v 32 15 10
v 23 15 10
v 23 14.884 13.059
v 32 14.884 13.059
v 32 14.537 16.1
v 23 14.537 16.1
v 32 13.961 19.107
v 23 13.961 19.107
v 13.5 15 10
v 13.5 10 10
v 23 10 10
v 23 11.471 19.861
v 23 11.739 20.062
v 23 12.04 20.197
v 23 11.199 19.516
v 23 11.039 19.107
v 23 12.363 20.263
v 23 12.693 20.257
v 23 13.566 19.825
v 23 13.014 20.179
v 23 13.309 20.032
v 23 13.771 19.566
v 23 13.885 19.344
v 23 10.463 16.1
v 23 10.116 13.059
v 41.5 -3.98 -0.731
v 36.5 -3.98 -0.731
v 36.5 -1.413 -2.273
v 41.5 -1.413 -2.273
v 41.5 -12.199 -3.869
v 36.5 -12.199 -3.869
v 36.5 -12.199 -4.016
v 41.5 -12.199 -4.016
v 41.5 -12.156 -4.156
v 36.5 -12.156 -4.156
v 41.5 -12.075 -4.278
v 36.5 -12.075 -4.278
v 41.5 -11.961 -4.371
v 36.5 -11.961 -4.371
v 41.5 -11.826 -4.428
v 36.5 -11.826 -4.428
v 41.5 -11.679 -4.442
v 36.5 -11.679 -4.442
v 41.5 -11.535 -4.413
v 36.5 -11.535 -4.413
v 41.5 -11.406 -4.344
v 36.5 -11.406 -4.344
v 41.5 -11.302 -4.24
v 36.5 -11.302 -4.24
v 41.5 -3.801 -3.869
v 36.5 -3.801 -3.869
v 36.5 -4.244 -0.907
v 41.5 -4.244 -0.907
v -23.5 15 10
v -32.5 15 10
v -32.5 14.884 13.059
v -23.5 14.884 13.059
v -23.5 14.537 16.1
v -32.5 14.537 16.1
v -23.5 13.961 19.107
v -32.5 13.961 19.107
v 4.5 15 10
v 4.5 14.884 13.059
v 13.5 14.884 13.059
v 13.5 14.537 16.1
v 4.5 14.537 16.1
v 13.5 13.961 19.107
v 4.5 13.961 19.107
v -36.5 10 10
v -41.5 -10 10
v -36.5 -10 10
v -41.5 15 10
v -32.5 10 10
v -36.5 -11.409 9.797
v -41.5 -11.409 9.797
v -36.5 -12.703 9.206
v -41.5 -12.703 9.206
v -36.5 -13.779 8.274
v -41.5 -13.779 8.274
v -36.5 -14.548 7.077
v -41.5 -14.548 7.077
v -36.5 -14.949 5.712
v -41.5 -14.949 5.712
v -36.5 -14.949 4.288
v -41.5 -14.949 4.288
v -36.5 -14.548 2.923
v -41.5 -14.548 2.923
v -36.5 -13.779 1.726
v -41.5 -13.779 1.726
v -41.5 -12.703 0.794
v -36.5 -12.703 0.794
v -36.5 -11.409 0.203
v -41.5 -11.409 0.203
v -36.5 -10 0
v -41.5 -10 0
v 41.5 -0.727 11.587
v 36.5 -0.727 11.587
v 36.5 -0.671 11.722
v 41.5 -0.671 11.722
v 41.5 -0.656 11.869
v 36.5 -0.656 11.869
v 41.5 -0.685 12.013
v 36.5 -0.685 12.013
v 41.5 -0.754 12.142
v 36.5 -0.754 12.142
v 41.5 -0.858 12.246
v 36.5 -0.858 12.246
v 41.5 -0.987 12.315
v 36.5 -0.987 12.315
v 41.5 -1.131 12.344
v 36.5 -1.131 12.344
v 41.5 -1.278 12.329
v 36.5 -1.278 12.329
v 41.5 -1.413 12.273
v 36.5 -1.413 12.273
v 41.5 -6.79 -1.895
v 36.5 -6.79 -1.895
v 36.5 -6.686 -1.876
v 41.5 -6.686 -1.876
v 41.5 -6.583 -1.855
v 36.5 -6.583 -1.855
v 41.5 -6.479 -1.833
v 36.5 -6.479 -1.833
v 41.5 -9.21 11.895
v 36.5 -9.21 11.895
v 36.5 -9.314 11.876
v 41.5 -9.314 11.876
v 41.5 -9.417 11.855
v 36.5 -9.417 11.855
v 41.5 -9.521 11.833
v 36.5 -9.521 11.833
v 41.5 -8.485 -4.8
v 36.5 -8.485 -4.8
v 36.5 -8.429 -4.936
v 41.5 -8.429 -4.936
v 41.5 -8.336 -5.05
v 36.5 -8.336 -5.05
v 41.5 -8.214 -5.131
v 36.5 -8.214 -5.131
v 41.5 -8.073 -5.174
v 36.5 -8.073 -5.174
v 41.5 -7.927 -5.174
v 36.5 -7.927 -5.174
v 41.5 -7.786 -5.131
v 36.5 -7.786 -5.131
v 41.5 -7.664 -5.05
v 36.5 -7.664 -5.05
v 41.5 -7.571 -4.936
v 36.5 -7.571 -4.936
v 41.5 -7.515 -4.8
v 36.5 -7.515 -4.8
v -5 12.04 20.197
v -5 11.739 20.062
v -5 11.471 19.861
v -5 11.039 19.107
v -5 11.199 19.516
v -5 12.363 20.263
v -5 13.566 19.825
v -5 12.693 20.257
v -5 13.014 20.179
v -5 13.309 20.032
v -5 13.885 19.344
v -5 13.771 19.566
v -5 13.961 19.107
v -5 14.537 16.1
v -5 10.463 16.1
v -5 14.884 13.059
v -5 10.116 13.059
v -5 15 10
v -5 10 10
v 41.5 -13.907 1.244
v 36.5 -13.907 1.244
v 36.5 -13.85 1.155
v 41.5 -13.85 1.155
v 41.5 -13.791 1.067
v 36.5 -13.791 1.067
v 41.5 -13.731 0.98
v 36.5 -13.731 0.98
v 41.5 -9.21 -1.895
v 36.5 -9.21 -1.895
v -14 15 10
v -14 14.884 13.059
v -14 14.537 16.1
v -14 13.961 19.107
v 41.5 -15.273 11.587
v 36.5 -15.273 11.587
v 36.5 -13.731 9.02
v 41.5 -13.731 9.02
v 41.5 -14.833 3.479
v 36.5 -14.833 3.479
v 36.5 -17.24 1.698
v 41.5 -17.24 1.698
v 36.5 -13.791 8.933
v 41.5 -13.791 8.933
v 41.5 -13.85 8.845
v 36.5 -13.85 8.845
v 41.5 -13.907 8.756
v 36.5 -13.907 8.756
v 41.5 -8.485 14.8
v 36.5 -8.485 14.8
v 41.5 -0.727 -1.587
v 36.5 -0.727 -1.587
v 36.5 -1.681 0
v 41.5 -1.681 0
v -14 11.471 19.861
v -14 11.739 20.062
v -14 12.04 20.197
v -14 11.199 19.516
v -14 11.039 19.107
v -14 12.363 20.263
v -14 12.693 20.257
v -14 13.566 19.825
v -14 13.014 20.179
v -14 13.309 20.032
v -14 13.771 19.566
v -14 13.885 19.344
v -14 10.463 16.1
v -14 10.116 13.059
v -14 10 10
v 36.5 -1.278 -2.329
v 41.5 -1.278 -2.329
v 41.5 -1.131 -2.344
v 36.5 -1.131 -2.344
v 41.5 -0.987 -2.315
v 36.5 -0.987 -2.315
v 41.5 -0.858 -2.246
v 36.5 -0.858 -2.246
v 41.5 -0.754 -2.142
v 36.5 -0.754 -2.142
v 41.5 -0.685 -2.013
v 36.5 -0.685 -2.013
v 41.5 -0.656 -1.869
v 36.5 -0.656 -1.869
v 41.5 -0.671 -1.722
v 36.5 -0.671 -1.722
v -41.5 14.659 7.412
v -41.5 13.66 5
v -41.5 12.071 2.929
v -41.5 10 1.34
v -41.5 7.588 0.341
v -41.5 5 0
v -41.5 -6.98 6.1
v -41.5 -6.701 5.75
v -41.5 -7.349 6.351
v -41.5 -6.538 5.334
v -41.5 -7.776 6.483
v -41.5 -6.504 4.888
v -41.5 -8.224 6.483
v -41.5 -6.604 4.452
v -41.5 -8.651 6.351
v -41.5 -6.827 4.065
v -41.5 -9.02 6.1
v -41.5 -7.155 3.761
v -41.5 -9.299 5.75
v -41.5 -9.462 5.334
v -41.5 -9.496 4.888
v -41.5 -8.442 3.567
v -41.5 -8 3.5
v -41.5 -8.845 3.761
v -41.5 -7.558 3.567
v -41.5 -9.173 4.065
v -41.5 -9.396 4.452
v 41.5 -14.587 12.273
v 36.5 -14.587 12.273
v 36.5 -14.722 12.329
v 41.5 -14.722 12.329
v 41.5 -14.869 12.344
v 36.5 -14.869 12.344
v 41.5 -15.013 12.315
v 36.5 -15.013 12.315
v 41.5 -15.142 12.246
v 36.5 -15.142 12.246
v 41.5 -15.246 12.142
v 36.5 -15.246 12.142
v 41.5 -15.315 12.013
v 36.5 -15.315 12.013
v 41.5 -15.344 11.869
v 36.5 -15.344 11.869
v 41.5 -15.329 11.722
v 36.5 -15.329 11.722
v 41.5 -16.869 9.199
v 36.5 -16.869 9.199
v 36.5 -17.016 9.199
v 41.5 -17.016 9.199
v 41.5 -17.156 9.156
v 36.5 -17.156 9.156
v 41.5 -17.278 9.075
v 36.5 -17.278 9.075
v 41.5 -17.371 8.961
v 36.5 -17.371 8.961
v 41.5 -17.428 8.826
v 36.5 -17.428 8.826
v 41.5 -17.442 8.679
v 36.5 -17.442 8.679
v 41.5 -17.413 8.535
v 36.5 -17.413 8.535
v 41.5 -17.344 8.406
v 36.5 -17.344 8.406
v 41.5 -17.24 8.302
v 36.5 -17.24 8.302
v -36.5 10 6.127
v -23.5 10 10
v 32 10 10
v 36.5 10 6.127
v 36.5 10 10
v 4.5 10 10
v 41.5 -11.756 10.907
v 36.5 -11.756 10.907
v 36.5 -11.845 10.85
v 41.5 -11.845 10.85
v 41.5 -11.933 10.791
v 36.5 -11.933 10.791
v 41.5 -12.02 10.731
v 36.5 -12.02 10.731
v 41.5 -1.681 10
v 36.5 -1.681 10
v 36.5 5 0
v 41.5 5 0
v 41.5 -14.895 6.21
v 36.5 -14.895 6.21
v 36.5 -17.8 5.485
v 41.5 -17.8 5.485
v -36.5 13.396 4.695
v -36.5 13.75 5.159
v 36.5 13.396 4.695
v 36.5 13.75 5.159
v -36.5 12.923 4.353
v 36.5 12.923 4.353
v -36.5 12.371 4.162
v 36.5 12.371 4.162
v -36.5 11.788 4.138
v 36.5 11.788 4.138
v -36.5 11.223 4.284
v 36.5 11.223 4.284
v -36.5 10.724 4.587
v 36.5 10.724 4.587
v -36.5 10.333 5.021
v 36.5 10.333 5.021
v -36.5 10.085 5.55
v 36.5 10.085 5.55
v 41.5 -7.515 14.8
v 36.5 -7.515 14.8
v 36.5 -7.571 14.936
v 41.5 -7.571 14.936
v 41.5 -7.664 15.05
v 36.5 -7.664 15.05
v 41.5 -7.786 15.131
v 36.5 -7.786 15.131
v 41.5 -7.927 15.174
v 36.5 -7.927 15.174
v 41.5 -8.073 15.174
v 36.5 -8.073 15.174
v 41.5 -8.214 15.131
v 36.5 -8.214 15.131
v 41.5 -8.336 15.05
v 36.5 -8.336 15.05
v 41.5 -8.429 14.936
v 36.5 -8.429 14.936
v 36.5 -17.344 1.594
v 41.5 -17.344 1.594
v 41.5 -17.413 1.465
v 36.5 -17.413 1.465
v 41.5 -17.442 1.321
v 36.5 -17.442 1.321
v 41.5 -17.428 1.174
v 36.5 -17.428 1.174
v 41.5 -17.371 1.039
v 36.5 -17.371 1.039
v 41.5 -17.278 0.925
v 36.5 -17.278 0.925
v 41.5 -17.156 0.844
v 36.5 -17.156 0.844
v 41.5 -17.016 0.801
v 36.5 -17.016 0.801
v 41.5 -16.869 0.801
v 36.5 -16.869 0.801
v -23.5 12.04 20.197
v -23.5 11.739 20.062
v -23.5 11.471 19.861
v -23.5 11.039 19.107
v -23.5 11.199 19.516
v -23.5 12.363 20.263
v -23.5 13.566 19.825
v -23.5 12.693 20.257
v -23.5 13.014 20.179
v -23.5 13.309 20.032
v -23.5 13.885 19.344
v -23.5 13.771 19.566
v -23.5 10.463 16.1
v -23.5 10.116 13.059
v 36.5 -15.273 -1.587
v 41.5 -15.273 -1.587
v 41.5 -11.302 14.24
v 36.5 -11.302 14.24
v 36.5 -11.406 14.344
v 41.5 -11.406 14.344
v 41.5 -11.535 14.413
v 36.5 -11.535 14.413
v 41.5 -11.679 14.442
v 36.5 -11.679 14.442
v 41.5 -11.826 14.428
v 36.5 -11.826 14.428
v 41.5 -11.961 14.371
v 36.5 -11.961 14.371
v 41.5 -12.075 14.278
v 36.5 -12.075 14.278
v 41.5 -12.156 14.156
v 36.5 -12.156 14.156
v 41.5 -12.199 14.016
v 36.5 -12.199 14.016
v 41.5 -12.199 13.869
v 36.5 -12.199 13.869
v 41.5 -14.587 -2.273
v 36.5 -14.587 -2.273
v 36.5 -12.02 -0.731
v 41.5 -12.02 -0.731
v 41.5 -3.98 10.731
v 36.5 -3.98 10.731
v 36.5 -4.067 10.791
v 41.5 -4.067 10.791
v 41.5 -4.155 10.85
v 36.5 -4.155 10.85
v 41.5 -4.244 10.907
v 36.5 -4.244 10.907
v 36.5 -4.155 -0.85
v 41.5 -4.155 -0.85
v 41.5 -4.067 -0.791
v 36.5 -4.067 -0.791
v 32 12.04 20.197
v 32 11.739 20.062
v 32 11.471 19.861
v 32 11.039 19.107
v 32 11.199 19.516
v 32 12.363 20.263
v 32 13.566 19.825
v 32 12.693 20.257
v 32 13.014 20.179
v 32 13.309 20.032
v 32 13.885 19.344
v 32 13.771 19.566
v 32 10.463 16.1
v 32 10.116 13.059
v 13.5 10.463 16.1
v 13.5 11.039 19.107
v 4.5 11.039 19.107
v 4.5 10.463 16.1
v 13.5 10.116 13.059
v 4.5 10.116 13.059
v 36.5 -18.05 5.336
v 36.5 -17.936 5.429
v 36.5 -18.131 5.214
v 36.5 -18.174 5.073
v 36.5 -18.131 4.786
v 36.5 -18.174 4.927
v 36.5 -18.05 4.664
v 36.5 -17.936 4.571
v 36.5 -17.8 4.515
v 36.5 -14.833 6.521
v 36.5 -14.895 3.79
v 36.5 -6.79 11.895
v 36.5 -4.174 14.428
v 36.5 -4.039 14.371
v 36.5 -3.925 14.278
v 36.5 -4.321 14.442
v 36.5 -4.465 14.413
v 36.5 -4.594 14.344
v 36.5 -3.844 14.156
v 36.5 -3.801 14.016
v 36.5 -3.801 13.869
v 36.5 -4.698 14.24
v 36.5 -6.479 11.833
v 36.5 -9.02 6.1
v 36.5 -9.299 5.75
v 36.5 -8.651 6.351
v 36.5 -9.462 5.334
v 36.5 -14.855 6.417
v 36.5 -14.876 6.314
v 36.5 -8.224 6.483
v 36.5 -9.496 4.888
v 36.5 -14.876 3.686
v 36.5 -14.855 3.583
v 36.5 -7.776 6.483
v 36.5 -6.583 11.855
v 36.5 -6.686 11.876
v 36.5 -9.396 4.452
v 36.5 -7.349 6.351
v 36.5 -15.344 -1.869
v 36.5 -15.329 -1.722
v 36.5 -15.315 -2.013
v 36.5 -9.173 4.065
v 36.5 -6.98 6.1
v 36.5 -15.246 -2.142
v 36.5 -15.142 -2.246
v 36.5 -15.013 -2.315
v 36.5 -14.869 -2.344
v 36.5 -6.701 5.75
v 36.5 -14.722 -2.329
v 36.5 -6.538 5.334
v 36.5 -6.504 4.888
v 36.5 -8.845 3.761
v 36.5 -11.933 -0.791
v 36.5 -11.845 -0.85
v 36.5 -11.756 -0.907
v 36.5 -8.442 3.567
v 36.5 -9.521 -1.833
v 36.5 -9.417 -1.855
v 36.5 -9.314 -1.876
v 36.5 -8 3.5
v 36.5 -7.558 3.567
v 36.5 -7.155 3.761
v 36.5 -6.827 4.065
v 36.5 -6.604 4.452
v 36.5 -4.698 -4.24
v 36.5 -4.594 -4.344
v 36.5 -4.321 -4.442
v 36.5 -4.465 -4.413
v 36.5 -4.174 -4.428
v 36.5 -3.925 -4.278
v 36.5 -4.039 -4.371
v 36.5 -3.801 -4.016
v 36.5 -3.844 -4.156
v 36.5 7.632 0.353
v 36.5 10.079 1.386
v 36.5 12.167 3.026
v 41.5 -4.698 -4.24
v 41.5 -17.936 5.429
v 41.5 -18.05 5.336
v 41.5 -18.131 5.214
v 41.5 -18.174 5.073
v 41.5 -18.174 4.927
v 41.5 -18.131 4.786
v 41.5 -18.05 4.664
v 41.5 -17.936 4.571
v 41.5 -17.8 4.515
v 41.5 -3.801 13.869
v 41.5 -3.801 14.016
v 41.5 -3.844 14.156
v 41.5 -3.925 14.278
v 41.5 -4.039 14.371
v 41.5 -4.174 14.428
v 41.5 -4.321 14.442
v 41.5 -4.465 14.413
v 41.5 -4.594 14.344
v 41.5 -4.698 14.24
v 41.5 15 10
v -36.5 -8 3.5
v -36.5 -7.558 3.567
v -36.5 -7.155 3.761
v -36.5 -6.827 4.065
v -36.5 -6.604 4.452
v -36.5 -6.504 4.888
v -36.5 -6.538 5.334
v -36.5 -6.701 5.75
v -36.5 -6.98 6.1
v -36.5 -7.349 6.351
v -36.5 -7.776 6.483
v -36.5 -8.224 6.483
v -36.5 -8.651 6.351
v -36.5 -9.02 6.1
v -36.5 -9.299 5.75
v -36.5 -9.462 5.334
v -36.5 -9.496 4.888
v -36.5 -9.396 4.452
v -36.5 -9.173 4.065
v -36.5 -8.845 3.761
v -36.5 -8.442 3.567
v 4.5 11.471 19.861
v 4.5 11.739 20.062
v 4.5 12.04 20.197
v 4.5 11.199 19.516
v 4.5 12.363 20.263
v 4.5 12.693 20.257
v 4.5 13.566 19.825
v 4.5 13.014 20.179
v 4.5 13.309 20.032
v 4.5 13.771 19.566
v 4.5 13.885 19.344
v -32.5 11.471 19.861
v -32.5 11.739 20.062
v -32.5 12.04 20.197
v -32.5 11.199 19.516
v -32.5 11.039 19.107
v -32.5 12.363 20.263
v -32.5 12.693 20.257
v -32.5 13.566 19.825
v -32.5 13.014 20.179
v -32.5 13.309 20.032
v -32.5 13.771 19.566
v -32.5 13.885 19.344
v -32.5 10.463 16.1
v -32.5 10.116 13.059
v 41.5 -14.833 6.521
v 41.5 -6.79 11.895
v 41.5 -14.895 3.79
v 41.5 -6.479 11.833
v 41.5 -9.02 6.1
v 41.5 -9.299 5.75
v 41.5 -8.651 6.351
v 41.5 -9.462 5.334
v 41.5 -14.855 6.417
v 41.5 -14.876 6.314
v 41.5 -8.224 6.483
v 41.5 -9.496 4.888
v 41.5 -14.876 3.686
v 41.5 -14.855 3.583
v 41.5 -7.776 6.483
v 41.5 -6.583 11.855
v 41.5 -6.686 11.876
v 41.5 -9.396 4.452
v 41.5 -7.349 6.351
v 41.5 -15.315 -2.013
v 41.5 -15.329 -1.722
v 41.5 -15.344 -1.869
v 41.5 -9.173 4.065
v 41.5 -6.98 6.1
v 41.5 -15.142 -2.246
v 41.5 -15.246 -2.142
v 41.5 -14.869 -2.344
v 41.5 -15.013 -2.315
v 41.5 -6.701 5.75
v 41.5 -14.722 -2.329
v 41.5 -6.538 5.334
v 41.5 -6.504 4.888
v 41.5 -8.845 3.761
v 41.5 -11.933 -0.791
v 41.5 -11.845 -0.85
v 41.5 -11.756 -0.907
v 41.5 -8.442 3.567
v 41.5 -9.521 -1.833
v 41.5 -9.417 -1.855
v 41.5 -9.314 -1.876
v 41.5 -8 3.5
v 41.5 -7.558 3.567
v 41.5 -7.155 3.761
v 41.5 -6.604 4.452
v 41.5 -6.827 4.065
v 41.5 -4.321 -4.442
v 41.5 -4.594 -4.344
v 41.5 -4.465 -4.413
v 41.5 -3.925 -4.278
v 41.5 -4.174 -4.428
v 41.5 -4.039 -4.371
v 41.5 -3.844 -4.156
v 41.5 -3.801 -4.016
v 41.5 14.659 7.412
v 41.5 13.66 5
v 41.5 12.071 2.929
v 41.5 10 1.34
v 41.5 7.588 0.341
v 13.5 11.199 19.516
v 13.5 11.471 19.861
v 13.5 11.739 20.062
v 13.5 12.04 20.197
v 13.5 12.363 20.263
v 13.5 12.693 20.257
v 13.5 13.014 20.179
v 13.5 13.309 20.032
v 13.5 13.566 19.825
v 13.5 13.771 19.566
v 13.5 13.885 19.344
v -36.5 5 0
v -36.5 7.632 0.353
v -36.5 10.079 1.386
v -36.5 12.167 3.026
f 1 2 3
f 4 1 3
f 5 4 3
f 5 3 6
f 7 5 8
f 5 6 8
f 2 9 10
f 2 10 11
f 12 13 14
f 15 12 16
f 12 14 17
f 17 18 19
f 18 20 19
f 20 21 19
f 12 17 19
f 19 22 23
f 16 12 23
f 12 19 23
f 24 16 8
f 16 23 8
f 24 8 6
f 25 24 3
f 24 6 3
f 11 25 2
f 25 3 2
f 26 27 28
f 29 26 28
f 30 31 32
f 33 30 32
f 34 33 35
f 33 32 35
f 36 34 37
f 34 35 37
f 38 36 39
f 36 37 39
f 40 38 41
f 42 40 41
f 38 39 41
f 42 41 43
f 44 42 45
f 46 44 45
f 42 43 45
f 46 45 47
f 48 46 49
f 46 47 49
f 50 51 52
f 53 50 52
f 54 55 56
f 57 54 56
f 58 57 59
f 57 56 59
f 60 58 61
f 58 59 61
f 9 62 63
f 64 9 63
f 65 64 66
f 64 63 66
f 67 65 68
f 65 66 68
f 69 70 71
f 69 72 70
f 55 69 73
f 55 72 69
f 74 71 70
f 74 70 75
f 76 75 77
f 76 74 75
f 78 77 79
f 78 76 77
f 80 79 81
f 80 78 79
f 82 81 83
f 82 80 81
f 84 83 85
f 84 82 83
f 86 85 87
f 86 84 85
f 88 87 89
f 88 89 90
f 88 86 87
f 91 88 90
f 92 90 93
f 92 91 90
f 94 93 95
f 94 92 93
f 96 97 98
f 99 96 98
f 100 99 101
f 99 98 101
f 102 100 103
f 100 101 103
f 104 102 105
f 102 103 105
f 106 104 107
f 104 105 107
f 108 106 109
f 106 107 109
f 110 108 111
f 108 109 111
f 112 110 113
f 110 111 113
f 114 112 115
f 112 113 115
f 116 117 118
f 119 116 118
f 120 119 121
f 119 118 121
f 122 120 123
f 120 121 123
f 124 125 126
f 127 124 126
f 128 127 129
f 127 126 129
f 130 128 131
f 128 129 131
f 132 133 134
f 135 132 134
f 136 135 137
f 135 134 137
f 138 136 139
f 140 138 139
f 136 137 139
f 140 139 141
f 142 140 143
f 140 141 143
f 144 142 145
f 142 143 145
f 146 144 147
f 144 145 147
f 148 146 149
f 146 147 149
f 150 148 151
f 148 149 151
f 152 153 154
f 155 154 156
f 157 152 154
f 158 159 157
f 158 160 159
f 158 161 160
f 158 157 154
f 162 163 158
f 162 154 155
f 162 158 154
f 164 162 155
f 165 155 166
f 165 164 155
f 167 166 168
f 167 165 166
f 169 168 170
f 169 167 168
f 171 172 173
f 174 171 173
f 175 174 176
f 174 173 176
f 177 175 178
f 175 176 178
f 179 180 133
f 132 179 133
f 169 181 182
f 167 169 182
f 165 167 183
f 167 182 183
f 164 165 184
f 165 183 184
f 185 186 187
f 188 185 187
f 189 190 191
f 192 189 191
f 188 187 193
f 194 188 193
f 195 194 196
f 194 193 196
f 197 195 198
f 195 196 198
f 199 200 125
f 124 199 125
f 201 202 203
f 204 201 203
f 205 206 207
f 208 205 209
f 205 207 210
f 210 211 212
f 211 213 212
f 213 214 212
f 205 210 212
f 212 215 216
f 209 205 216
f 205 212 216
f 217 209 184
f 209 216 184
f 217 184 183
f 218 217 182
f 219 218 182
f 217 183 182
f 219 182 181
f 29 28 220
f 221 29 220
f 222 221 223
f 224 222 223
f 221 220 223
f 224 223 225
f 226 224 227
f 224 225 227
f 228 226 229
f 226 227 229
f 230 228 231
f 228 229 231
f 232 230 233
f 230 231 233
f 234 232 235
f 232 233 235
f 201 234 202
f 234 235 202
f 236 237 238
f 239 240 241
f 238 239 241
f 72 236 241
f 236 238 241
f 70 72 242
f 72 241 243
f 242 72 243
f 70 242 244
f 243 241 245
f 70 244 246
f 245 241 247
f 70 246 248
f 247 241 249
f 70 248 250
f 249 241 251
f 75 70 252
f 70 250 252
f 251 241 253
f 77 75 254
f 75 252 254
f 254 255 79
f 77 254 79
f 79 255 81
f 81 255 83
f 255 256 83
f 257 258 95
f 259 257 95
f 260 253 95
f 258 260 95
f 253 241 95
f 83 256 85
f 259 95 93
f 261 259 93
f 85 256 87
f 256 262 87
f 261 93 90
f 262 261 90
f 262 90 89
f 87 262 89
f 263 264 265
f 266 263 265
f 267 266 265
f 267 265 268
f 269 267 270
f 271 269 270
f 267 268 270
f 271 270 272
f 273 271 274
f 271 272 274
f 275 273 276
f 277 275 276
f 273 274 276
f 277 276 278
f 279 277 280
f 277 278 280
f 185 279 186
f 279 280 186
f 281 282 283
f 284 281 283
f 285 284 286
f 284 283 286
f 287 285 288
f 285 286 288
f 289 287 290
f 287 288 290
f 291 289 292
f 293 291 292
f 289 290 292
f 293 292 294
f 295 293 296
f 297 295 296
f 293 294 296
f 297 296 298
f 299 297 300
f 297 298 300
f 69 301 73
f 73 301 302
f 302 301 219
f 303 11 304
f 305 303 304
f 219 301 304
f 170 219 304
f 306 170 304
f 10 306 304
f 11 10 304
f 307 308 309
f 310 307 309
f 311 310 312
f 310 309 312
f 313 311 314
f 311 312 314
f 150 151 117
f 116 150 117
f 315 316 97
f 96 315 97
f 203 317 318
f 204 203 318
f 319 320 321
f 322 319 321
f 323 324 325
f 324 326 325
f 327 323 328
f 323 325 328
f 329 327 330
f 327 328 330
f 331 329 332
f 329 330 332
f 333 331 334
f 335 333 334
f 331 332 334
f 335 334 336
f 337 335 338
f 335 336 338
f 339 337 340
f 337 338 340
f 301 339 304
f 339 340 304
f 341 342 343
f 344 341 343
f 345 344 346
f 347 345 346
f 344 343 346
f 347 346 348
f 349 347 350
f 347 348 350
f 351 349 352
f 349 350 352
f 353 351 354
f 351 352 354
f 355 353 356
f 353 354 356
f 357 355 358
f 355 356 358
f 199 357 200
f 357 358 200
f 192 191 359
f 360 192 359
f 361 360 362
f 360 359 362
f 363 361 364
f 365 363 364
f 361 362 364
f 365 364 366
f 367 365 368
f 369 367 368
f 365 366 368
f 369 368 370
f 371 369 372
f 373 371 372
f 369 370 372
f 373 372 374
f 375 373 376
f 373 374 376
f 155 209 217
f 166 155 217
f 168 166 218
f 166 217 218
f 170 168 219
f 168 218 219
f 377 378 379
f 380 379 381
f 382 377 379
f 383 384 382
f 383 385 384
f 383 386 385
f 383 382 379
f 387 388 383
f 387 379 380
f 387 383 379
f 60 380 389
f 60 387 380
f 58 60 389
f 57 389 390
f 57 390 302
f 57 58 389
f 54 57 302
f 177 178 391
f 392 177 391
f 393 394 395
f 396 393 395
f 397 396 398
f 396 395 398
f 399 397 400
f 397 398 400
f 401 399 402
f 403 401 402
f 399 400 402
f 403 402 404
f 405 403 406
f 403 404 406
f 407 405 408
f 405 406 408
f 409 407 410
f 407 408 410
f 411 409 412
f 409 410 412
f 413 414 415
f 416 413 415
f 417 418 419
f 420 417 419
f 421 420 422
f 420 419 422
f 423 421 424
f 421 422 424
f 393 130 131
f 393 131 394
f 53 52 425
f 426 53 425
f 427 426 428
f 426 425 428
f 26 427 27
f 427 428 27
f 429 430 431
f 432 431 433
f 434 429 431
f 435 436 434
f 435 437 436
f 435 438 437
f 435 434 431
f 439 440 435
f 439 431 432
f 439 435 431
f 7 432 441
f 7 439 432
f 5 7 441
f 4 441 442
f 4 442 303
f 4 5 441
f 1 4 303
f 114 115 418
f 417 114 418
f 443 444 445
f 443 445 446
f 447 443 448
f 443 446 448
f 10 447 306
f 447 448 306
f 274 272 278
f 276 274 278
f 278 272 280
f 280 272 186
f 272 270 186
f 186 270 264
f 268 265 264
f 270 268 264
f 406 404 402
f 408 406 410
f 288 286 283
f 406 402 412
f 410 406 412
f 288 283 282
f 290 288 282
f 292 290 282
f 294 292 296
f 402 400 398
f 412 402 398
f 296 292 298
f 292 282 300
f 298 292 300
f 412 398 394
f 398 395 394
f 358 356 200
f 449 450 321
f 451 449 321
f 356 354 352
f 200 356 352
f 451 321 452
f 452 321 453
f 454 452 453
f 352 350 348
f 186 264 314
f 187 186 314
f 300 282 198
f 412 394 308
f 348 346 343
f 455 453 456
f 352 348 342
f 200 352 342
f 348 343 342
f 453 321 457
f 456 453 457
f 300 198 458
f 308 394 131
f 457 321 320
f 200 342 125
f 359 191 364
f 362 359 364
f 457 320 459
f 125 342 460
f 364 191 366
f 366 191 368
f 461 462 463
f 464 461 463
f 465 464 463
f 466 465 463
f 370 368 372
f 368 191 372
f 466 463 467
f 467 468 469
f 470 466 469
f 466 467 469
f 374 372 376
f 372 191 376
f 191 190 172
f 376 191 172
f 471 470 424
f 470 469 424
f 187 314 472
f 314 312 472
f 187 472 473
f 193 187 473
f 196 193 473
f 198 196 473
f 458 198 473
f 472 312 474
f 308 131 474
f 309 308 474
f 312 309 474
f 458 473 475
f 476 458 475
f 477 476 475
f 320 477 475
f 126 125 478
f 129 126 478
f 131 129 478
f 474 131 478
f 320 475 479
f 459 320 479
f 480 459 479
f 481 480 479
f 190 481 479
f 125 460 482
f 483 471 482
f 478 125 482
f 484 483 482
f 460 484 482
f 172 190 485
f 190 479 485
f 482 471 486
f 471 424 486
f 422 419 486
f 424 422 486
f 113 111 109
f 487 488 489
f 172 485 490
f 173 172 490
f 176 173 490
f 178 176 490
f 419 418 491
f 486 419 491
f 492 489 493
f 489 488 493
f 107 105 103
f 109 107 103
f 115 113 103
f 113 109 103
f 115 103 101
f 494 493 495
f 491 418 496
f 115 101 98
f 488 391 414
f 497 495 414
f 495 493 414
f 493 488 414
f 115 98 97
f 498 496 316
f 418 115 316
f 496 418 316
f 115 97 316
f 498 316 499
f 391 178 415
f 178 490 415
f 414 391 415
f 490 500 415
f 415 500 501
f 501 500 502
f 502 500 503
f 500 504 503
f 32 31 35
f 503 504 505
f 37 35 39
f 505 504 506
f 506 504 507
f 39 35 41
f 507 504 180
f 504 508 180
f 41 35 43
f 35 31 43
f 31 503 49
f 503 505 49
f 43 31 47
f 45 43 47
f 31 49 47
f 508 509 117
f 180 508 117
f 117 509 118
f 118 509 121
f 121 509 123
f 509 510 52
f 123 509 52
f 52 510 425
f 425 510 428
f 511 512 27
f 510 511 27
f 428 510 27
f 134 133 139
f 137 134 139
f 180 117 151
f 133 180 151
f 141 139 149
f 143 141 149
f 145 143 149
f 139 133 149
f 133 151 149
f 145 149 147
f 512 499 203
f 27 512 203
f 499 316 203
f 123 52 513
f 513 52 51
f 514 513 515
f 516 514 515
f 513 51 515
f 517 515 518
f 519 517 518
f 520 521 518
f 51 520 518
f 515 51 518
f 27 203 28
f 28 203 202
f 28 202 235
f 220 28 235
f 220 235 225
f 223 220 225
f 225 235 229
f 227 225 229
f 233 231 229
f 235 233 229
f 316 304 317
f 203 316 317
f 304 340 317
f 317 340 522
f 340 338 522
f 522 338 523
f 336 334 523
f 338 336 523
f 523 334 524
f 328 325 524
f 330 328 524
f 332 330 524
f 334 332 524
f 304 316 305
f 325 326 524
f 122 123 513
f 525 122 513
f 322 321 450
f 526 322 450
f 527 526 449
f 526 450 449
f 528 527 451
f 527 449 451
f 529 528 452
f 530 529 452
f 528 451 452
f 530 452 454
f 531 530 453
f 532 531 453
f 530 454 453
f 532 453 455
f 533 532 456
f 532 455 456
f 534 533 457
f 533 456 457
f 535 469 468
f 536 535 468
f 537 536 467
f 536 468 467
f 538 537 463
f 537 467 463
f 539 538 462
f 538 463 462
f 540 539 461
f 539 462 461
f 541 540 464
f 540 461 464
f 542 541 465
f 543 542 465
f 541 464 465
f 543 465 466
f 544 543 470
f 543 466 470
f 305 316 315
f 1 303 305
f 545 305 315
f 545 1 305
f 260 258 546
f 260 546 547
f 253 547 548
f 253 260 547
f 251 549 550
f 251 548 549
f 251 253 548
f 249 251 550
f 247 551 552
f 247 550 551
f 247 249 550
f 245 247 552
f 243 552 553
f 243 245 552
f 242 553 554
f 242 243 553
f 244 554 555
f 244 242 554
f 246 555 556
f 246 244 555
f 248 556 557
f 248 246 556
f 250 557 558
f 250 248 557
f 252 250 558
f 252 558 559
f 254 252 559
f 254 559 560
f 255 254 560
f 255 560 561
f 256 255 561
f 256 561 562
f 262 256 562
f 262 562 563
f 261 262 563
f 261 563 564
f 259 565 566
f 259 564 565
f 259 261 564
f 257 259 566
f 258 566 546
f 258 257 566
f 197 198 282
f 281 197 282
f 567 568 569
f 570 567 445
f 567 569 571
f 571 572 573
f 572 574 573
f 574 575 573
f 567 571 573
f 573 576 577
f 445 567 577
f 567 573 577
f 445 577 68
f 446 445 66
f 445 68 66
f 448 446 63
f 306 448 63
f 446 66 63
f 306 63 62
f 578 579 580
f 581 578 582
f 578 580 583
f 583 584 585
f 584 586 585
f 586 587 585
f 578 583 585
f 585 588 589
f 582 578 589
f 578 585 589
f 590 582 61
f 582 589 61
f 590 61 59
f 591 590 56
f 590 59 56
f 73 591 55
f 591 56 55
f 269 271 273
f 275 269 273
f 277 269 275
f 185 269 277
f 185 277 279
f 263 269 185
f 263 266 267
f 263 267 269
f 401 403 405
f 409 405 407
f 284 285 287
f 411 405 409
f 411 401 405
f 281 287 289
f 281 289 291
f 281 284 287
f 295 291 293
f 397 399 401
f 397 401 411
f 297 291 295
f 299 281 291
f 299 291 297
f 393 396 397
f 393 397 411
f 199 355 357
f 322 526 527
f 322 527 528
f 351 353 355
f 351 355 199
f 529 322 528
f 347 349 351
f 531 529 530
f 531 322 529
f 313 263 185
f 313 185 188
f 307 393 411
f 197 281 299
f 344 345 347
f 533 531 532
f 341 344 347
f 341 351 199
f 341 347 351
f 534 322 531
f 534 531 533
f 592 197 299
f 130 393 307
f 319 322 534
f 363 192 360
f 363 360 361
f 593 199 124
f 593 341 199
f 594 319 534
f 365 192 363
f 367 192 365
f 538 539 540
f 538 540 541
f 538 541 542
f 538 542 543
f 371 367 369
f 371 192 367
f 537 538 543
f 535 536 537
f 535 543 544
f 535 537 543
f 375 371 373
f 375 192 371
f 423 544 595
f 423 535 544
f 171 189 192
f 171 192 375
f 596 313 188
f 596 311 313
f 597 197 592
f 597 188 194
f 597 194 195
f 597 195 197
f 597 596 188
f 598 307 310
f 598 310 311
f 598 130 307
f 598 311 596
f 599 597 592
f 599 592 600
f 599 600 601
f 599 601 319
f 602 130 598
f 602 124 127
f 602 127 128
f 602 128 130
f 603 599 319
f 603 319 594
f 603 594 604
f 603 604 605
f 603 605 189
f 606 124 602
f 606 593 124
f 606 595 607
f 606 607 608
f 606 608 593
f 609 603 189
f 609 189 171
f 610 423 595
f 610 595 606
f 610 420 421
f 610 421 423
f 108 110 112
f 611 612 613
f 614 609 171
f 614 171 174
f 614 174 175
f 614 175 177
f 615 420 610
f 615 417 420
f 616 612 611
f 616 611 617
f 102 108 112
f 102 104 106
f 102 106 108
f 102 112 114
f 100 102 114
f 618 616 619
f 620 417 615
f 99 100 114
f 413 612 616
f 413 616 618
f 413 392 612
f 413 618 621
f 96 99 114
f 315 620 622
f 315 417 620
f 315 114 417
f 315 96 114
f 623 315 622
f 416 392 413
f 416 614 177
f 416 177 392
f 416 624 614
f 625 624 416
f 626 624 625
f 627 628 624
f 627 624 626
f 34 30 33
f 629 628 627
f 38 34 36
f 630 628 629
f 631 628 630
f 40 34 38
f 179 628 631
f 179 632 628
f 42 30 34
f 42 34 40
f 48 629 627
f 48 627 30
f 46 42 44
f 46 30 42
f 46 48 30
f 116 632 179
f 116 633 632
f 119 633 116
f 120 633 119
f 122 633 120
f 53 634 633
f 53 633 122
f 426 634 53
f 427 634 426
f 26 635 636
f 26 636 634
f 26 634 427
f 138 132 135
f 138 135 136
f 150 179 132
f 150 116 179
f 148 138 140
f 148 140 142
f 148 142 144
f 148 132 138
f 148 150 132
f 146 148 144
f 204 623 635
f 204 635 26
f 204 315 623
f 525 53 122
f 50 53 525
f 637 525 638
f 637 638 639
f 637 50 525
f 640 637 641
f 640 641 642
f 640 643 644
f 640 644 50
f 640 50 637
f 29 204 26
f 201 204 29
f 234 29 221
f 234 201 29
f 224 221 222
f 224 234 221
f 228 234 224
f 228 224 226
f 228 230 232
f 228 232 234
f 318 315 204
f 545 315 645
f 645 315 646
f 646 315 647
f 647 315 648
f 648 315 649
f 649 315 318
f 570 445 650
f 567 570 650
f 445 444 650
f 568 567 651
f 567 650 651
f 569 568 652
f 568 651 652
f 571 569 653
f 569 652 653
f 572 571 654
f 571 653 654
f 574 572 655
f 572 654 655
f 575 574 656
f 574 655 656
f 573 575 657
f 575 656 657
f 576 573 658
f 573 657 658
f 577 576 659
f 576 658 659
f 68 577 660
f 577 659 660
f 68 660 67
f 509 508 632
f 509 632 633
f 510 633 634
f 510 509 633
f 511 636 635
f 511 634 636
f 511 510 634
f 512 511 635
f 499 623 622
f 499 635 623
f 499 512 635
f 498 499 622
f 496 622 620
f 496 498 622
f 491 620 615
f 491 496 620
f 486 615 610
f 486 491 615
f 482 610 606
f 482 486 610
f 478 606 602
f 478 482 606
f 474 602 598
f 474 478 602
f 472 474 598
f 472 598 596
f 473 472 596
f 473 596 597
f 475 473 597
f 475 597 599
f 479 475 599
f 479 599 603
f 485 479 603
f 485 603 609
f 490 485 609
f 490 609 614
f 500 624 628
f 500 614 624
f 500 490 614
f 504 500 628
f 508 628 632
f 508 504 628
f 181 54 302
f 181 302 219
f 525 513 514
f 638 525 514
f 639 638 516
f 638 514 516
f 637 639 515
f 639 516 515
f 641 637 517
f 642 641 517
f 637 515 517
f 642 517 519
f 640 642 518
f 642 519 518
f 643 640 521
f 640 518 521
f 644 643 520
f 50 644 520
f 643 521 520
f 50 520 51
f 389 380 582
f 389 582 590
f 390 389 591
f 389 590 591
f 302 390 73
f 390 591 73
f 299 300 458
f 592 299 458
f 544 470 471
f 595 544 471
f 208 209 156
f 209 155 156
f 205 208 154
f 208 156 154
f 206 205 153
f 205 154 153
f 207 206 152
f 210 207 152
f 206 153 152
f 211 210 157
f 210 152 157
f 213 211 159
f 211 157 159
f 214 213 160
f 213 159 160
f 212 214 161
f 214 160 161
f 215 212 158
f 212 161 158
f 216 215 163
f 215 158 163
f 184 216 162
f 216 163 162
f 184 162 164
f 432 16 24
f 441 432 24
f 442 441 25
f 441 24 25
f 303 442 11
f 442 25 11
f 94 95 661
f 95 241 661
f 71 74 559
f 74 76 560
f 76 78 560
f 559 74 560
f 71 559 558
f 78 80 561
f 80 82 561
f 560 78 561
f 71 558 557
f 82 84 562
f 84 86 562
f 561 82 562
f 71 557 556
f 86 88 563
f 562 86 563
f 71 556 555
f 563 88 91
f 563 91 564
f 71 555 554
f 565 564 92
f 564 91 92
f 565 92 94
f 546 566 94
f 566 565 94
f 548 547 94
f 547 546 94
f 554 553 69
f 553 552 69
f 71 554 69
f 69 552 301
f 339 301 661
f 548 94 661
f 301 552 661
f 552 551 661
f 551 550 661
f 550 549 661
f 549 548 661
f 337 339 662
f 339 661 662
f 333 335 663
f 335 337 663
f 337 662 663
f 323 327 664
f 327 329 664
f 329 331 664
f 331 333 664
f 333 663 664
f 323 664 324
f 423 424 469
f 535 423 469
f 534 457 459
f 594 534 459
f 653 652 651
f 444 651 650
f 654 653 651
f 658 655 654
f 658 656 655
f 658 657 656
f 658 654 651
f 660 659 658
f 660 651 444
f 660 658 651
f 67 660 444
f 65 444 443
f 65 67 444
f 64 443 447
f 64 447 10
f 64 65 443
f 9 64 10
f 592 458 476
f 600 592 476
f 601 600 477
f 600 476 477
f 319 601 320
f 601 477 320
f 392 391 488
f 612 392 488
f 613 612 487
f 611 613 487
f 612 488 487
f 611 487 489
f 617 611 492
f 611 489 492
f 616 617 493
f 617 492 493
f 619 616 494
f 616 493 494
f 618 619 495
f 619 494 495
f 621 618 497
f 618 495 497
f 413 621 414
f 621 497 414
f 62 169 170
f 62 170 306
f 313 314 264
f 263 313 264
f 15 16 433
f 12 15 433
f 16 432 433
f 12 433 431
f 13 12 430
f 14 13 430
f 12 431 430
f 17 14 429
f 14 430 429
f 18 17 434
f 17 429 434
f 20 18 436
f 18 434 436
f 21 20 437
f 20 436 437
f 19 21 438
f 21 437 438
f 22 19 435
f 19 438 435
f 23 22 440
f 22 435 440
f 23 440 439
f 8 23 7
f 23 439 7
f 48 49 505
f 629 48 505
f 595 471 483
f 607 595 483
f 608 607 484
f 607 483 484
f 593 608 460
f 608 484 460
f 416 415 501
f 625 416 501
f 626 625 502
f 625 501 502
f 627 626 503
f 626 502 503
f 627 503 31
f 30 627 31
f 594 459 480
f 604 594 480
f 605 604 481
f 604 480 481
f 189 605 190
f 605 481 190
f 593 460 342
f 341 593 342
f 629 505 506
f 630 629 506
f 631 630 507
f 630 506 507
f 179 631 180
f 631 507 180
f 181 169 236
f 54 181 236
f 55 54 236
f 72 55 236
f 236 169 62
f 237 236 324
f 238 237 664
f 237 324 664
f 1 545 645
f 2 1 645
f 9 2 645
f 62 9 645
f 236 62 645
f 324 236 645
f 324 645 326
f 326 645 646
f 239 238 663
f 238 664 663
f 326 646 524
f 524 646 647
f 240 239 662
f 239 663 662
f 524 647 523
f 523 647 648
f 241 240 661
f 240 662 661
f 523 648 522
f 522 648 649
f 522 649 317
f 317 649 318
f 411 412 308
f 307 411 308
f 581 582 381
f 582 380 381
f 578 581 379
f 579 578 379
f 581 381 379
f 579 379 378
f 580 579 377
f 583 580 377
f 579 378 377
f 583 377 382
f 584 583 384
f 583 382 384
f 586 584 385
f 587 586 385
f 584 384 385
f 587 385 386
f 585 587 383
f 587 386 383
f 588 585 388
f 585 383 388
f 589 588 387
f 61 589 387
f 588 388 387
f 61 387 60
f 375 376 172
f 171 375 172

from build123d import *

# Parameters (mm, degrees)
BOSS_EXTRU_1_DEPTH               = 10
BOSS_EXTRU_2_START               = -9
BOSS_EXTRU_2_DEPTH               = 9
CONG_1_R                         = 1.5
R_P_TITION_LIN_AIRE1_COUNT       = 4
R_P_TITION_LIN_AIRE1_PITCH       = 18.5
CONG_1_OF_R_P_TITION_LIN_AIRE1_R = 1.5
ENL_V_MAT_EXTRU_1_DEPTH          = 82.974649073
ENL_V_MAT_EXTRU_1_DEPTH_BACK     = 82.974649073
ESQUISSE4_R                      = 1.5
CONG_2_RADIUS                    = 5
CONG_2_LENGTH                    = 5
CONG_3_RADIUS                    = 5
CONG_3_LENGTH                    = 5
CONG_4_R                         = 10
BOSS_EXTRU_3_START               = 73
ESQUISSE5_R                      = 1.5
BOSS_EXTRU_3_DEPTH               = 5
CONG_7_R                         = 2


with BuildPart() as part:
    # Esquisse1 → Boss.-Extru.1 (new body)
    with BuildSketch(Plane.XY):
        Polygon((-36.5, 10), (36.5, 10), (36.5, -10), (36.5, -15), (41.5, -15), (41.5, 15), (-41.5, 15), (-41.5, -15), (-36.5, -15), (-36.5, -10), align=None)
    extrude(amount=BOSS_EXTRU_1_DEPTH)

    # Esquisse2 → Boss.-Extru.2 (add)
    with BuildSketch(Plane.ZY.offset(41.5).offset(BOSS_EXTRU_2_START)):
        with BuildLine():
            Line((10, 10), (10, 15))
            ThreePointArc((10, 15), (17.110731327, 14.370095429), (24, 12.5))
            ThreePointArc((24, 12.5), (17.110731327, 10.629904571), (10, 10))
        make_face()
    boss_extru_2 = extrude(amount=-BOSS_EXTRU_2_DEPTH)

    # Congé1
    cong_1_edges = [part.edges().sort_by_distance(p)[0] for p in [
        (-28, 12.5, 24),
    ]]
    fillet(cong_1_edges, radius=CONG_1_R)

    # Répétition linéaire1: Boss.-Extru.2 ×4
    with Locations(*[(i * R_P_TITION_LIN_AIRE1_PITCH, 0, 0) for i in range(1, R_P_TITION_LIN_AIRE1_COUNT)]):
        add(boss_extru_2)

    # Congé1 of Répétition linéaire1
    cong_1_of_r_p_tition_lin_aire1_edges = [part.edges().sort_by_distance(p)[0] for p in [
        (-9.5, 12.5, 24),
        (9, 12.5, 24),
        (27.5, 12.5, 24),
    ]]
    fillet(cong_1_of_r_p_tition_lin_aire1_edges, radius=CONG_1_OF_R_P_TITION_LIN_AIRE1_R)

    # Esquisse4 → Enlèv. mat.-Extru.1 (cut, two sides: drawn at the far end of the back side and taken through both)
    with BuildSketch(Plane(origin=(-36.5, 0, 0), x_dir=(0, 0, -1), z_dir=(1, 0, 0)).offset(-ENL_V_MAT_EXTRU_1_DEPTH_BACK)):
        with Locations((-5, -8)):
            Circle(ESQUISSE4_R)
    extrude(amount=ENL_V_MAT_EXTRU_1_DEPTH + ENL_V_MAT_EXTRU_1_DEPTH_BACK, mode=Mode.SUBTRACT)

    # Congé2: full round fillet: the end face becomes a half cylinder, R = half its width
    cong_2_face = Plane((-39, -15, 5), x_dir=(1, 0, 0), z_dir=(0, -1, 0))  # on the end face: x along it, z out of the body
    cong_2_slab = cong_2_face.offset(-CONG_2_RADIUS / 2) * Box(CONG_2_LENGTH, 2 * CONG_2_RADIUS, CONG_2_RADIUS, mode=Mode.PRIVATE)  # the body's end, R deep
    cong_2_round = Plane((-39, -10, 5), x_dir=(0, -1, 0), z_dir=(1, 0, 0)) * Cylinder(CONG_2_RADIUS, CONG_2_LENGTH, mode=Mode.PRIVATE)  # its axis R under the face
    add(cong_2_slab - cong_2_round, mode=Mode.SUBTRACT)

    # Congé3: full round fillet: the end face becomes a half cylinder, R = half its width
    cong_3_face = Plane((39, -15, 5), x_dir=(1, 0, 0), z_dir=(0, -1, 0))  # on the end face: x along it, z out of the body
    cong_3_slab = cong_3_face.offset(-CONG_3_RADIUS / 2) * Box(CONG_3_LENGTH, 2 * CONG_3_RADIUS, CONG_3_RADIUS, mode=Mode.PRIVATE)  # the body's end, R deep
    cong_3_round = Plane((39, -10, 5), x_dir=(0, -1, 0), z_dir=(1, 0, 0)) * Cylinder(CONG_3_RADIUS, CONG_3_LENGTH, mode=Mode.PRIVATE)  # its axis R under the face
    add(cong_3_slab - cong_3_round, mode=Mode.SUBTRACT)

    # Congé4
    # the kernel refuses this fillet: 10 mm, written as the material it takes off along each edge
    with BuildSketch(Plane(origin=(66.5, 15, 0), x_dir=(0, -1, 0), z_dir=(-1, 0, 0))) as cong_4_piece_1:
        with BuildLine():
            CenterArc((CONG_4_R, CONG_4_R), CONG_4_R, 180, 90)
            Line((0, CONG_4_R), (0, 0))
            Line((0, 0), (CONG_4_R, 0))
        make_face()
    extrude(amount=133, mode=Mode.SUBTRACT)

    # Esquisse5 → Boss.-Extru.3 (add)
    with BuildSketch(Plane(origin=(-36.5, 0, 0), x_dir=(0, 0, -1), z_dir=(1, 0, 0)).offset(BOSS_EXTRU_3_START)):
        with BuildLine():
            Line((-14.800353701, -8.485147863), (-11.894696869, -9.209609478))
            ThreePointArc((-11.894696869, -9.209609478), (-11.865496963, -9.365632254), (-11.832766827, -9.520952824))
            Line((-11.832766827, -9.520952824), (-14.240004245, -11.302214812))
            ThreePointArc((-14.240004245, -11.302214812), (-14.404532618, -11.895484958), (-13.868688146, -12.198651174))
            Line((-13.868688146, -12.198651174), (-10.906971813, -11.756019702))
            ThreePointArc((-10.906971813, -11.756019702), (-10.820287286, -11.888991631), (-10.730609975, -12.019963846))
            Line((-10.730609975, -12.019963846), (-12.272947904, -14.586845216))
            ThreePointArc((-12.272947904, -14.586845216), (-12.197917644, -15.197917644), (-11.586845216, -15.272947904))
            Line((-11.586845216, -15.272947904), (-9.019963846, -13.730609975))
            ThreePointArc((-9.019963846, -13.730609975), (-8.888991631, -13.820287286), (-8.756019702, -13.906971813))
            Line((-8.756019702, -13.906971813), (-9.198651174, -16.868688146))
            ThreePointArc((-9.198651174, -16.868688146), (-8.895484958, -17.404532618), (-8.302214812, -17.240004245))
            Line((-8.302214812, -17.240004245), (-6.520952824, -14.832766827))
            ThreePointArc((-6.520952824, -14.832766827), (-6.365632254, -14.865496963), (-6.209609478, -14.894696869))
            Line((-6.209609478, -14.894696869), (-5.485147863, -17.800353701))
            ThreePointArc((-5.485147863, -17.800353701), (-5, -18.179392753), (-4.514852137, -17.800353701))
            Line((-4.514852137, -17.800353701), (-3.790390522, -14.894696869))
            ThreePointArc((-3.790390522, -14.894696869), (-3.634367746, -14.865496963), (-3.479047176, -14.832766827))
            Line((-3.479047176, -14.832766827), (-1.697785188, -17.240004245))
            ThreePointArc((-1.697785188, -17.240004245), (-1.104515042, -17.404532618), (-0.801348826, -16.868688146))
            Line((-0.801348826, -16.868688146), (-1.243980298, -13.906971813))
            ThreePointArc((-1.243980298, -13.906971813), (-1.111008369, -13.820287286), (-0.980036154, -13.730609975))
            Line((-0.980036154, -13.730609975), (1.586845216, -15.272947904))
            ThreePointArc((1.586845216, -15.272947904), (2.197917644, -15.197917644), (2.272947904, -14.586845216))
            Line((2.272947904, -14.586845216), (0.730609975, -12.019963846))
            ThreePointArc((0.730609975, -12.019963846), (0.820287286, -11.888991631), (0.906971813, -11.756019702))
            Line((0.906971813, -11.756019702), (3.868688146, -12.198651174))
            ThreePointArc((3.868688146, -12.198651174), (4.404532618, -11.895484958), (4.240004245, -11.302214812))
            Line((4.240004245, -11.302214812), (1.832766827, -9.520952824))
            ThreePointArc((1.832766827, -9.520952824), (1.865496963, -9.365632254), (1.894696869, -9.209609478))
            Line((1.894696869, -9.209609478), (4.800353701, -8.485147863))
            ThreePointArc((4.800353701, -8.485147863), (5.179392753, -8), (4.800353701, -7.514852137))
            Line((4.800353701, -7.514852137), (1.894696869, -6.790390522))
            ThreePointArc((1.894696869, -6.790390522), (1.865496963, -6.634367746), (1.832766827, -6.479047176))
            Line((1.832766827, -6.479047176), (4.240004245, -4.697785188))
            ThreePointArc((4.240004245, -4.697785188), (4.404532618, -4.104515042), (3.868688146, -3.801348826))
            Line((3.868688146, -3.801348826), (0.906971813, -4.243980298))
            ThreePointArc((0.906971813, -4.243980298), (0.820287286, -4.111008369), (0.730609975, -3.980036154))
            Line((0.730609975, -3.980036154), (2.272947904, -1.413154784))
            ThreePointArc((2.272947904, -1.413154784), (2.197917644, -0.802082356), (1.586845216, -0.727052096))
            Line((1.586845216, -0.727052096), (-0.980036154, -2.269390025))
            ThreePointArc((-0.980036154, -2.269390025), (-1.111008369, -2.179712714), (-1.243980298, -2.093028187))
            Line((-1.243980298, -2.093028187), (-0.801348826, 0.868688146))
            ThreePointArc((-0.801348826, 0.868688146), (-1.104515042, 1.404532618), (-1.697785188, 1.240004245))
            Line((-1.697785188, 1.240004245), (-3.479047176, -1.167233173))
            ThreePointArc((-3.479047176, -1.167233173), (-3.634367746, -1.134503037), (-3.790390522, -1.105303131))
            Line((-3.790390522, -1.105303131), (-4.514852137, 1.800353701))
            ThreePointArc((-4.514852137, 1.800353701), (-5, 2.179392753), (-5.485147863, 1.800353701))
            Line((-5.485147863, 1.800353701), (-6.209609478, -1.105303131))
            ThreePointArc((-6.209609478, -1.105303131), (-6.365632254, -1.134503037), (-6.520952824, -1.167233173))
            Line((-6.520952824, -1.167233173), (-8.302214812, 1.240004245))
            ThreePointArc((-8.302214812, 1.240004245), (-8.895484958, 1.404532618), (-9.198651174, 0.868688146))
            Line((-9.198651174, 0.868688146), (-8.756019702, -2.093028187))
            ThreePointArc((-8.756019702, -2.093028187), (-8.888991631, -2.179712714), (-9.019963846, -2.269390025))
            Line((-9.019963846, -2.269390025), (-11.586845216, -0.727052096))
            ThreePointArc((-11.586845216, -0.727052096), (-12.197917644, -0.802082356), (-12.272947904, -1.413154784))
            Line((-12.272947904, -1.413154784), (-10.730609975, -3.980036154))
            ThreePointArc((-10.730609975, -3.980036154), (-10.820287286, -4.111008369), (-10.906971813, -4.243980298))
            Line((-10.906971813, -4.243980298), (-13.868688146, -3.801348826))
            ThreePointArc((-13.868688146, -3.801348826), (-14.404532618, -4.104515042), (-14.240004245, -4.697785188))
            Line((-14.240004245, -4.697785188), (-11.832766827, -6.479047176))
            ThreePointArc((-11.832766827, -6.479047176), (-11.865496963, -6.634367746), (-11.894696869, -6.790390522))
            Line((-11.894696869, -6.790390522), (-14.800353701, -7.514852137))
            ThreePointArc((-14.800353701, -7.514852137), (-15.179392753, -8), (-14.800353701, -8.485147863))
        make_face()
        with Locations((-5, -8)):
            Circle(ESQUISSE5_R, mode=Mode.SUBTRACT)
    extrude(amount=BOSS_EXTRU_3_DEPTH)

    # Congé7
    cong_7_edges = [part.edges().sort_by_distance(p)[0] for p in [
        (0, 10, 1.339745962),
    ]]
    fillet(cong_7_edges, radius=CONG_7_R)


solid = part.part
